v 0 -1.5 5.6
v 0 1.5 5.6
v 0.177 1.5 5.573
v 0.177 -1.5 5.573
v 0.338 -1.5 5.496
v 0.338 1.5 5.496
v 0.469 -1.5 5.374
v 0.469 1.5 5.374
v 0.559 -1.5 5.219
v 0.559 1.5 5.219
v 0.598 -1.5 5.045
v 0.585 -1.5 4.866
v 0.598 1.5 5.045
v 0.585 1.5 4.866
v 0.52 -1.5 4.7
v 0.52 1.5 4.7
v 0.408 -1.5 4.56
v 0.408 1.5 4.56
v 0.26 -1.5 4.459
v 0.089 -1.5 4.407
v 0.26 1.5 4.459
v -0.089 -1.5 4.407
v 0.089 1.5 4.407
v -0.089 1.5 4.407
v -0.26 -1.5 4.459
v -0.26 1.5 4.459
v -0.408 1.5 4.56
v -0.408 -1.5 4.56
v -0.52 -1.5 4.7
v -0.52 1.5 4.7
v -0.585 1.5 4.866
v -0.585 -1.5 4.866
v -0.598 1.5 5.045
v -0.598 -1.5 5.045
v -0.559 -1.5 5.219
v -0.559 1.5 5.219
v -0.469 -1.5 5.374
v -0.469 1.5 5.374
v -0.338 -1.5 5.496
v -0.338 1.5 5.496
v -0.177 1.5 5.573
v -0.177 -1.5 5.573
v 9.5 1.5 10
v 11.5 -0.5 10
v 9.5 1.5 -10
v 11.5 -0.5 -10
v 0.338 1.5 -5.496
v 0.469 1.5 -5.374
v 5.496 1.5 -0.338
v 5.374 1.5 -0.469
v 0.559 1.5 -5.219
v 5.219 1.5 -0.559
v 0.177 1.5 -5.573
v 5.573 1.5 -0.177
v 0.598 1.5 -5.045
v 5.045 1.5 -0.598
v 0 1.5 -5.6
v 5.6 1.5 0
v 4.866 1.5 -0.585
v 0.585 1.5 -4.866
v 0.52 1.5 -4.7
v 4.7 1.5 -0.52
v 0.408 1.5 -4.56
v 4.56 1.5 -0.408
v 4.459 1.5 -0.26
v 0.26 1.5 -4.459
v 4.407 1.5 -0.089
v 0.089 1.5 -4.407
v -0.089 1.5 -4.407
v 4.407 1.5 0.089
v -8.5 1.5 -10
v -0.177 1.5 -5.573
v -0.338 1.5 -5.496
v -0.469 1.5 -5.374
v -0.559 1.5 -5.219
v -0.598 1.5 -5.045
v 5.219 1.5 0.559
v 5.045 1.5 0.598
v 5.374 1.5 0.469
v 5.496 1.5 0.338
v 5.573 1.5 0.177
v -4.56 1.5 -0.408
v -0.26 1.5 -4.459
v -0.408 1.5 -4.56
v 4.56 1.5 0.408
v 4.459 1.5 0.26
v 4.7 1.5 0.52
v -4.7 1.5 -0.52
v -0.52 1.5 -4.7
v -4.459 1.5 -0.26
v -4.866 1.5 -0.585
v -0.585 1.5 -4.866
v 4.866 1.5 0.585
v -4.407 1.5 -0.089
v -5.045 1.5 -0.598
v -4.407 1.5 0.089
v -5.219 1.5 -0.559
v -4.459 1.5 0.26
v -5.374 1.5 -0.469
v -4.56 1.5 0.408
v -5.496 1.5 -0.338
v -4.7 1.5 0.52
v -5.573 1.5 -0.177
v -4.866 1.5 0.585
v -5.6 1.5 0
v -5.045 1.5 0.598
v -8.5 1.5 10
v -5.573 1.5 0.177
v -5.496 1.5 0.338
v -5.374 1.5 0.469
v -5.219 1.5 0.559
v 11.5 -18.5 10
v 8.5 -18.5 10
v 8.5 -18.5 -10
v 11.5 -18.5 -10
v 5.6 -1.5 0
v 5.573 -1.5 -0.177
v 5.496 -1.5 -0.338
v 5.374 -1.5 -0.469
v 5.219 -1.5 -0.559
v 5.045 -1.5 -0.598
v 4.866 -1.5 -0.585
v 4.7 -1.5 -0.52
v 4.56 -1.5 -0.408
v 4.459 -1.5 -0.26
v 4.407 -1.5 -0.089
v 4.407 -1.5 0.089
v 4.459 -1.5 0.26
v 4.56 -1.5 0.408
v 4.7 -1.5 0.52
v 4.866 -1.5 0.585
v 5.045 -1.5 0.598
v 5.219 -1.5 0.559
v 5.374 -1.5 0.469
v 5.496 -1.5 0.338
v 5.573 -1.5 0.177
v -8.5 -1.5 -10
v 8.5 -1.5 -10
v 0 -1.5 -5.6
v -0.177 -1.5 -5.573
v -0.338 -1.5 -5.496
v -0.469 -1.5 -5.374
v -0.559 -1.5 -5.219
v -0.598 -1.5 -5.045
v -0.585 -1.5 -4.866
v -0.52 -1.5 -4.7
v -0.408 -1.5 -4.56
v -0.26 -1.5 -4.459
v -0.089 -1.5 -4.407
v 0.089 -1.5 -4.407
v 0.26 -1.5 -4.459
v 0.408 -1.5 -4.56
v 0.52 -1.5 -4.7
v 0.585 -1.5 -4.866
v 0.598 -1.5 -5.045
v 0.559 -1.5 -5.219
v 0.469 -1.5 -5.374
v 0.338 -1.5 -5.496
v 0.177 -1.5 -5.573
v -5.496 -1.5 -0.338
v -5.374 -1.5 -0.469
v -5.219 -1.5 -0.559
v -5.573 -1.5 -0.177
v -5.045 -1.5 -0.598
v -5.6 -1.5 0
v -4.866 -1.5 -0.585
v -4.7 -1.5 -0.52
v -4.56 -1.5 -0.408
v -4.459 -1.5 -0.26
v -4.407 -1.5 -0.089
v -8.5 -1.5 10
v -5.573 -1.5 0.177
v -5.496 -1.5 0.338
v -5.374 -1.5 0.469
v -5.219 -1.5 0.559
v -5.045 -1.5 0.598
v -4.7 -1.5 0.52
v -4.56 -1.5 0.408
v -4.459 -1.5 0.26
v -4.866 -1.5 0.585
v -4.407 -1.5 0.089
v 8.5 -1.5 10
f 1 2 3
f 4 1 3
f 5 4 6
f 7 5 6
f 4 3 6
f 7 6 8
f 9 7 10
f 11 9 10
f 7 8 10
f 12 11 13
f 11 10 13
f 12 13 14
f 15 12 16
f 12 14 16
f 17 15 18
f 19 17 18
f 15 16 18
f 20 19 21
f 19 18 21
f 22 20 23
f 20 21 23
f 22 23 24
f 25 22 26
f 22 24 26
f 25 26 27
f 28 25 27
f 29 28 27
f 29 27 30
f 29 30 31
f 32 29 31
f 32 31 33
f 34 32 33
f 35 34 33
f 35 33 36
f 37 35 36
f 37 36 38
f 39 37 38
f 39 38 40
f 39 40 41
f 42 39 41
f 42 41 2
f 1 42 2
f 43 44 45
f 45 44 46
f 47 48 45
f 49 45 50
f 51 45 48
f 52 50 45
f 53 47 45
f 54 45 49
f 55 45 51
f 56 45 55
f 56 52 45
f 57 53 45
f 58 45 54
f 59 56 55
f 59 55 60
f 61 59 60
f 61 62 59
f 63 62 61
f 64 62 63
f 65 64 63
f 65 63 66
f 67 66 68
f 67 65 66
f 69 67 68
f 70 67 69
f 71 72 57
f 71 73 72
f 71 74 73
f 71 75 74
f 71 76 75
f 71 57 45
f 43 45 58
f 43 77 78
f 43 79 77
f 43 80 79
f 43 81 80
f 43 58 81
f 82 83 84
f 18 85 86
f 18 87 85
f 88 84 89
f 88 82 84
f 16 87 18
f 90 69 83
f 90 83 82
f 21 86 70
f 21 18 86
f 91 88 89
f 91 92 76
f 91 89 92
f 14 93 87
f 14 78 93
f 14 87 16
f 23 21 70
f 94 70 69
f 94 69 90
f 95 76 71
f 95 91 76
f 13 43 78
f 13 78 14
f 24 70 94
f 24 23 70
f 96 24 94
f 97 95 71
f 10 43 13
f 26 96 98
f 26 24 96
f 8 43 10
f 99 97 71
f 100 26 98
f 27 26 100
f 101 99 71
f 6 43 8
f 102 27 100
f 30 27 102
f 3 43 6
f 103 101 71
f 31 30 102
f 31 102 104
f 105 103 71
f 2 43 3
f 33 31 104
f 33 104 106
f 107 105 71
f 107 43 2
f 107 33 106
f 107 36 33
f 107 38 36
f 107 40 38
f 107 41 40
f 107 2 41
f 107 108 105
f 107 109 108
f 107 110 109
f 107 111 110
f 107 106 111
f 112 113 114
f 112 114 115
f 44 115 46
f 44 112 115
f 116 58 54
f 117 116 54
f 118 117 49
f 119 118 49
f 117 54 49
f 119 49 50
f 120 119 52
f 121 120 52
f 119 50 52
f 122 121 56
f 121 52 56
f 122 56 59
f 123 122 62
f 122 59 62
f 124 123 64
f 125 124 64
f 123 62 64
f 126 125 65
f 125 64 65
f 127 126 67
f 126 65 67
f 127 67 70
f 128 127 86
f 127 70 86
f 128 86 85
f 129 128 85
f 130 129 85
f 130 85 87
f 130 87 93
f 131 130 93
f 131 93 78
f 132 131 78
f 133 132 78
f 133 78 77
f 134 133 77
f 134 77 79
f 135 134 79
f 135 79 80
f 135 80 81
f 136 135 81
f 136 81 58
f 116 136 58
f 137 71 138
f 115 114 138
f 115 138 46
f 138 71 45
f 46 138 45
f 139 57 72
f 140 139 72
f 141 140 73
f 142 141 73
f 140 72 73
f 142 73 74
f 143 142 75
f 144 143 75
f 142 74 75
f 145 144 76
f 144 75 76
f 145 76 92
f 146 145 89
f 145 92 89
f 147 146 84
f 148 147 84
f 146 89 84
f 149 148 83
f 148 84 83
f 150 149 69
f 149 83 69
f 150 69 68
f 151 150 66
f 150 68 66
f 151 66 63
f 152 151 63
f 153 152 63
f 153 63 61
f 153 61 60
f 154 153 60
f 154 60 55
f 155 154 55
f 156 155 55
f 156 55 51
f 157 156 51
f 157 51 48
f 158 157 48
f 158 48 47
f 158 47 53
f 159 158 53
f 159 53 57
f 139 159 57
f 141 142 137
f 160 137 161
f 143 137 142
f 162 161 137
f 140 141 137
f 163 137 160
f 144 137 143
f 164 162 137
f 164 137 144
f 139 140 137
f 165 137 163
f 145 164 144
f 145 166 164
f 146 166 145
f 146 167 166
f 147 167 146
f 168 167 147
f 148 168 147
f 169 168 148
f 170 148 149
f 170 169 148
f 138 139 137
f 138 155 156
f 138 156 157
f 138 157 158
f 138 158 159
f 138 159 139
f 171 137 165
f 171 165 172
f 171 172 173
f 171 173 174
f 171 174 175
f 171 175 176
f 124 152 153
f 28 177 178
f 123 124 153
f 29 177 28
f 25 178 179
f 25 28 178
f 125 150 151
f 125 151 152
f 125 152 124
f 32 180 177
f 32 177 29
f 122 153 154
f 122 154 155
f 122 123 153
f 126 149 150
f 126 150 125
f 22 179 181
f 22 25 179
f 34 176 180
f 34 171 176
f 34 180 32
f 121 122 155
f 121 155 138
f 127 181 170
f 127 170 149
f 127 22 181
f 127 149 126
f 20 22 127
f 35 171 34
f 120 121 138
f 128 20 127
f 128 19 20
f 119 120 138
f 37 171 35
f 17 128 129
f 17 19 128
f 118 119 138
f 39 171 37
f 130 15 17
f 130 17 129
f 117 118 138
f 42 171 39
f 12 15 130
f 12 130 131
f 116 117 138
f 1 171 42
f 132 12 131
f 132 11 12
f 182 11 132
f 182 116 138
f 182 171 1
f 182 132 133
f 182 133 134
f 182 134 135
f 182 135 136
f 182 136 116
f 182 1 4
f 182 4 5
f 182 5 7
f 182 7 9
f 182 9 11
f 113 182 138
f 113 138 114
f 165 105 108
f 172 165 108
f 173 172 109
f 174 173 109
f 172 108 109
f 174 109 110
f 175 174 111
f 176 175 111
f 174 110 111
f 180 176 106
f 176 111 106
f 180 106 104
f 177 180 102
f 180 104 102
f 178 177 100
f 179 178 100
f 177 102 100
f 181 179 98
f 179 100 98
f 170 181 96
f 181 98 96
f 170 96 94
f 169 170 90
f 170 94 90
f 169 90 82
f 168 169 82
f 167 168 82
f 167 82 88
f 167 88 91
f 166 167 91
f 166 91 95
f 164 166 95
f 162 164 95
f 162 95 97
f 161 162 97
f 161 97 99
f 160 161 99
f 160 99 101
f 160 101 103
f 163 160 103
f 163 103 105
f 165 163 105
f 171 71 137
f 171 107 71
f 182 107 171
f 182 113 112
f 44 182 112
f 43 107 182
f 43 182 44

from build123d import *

# Parameters (mm, degrees)
F1_DEPTH        = 10
F2_SIZE         = 2
F4_D            = 1.2
F4_DEPTH        = 4
F4_TIP          = 0.3605163714
F4_COPIES_COUNT = 4


# Not quite as in the source:
# - a pattern or mirror of a feature is missing from the dataset's text; its kind, count and spacing are read off the source's solid


with BuildPart() as f1:
    # F0 (on Top) → F1 (new body, symmetric)
    with BuildSketch(Plane.XY):
        Polygon((8.5, 1.5), (-8.5, 1.5), (-8.5, -1.5), (8.5, -1.5), (8.5, -18.5), (11.5, -18.5), (11.5, 1.5), align=None)
    extrude(amount=F1_DEPTH, both=True)

    # F2
    f2_edges = [f1.edges().sort_by_distance(p)[0] for p in [
        (11.5, 1.5, 0),
    ]]
    chamfer(f2_edges, length=F2_SIZE)

    # F4
    with Locations(Plane.XZ.offset(1.5)):
        with Locations((-5, 0)):
            f4 = Hole(F4_D / 2, depth=F4_DEPTH)
            with Locations((0, 0, -(F4_DEPTH + F4_TIP / 2))):  # 118° drill point
                Cone(0, F4_D / 2, F4_TIP, mode=Mode.SUBTRACT)

    # F4_copies: F4 ×4 about axis
    f4_copies_axis = Axis((0, 0, 0), (0, 1, 0))
    for i in range(1, F4_COPIES_COUNT):
        add(f4.rotate(f4_copies_axis, i * 360 / F4_COPIES_COUNT), mode=Mode.SUBTRACT)


solid = f1.part
